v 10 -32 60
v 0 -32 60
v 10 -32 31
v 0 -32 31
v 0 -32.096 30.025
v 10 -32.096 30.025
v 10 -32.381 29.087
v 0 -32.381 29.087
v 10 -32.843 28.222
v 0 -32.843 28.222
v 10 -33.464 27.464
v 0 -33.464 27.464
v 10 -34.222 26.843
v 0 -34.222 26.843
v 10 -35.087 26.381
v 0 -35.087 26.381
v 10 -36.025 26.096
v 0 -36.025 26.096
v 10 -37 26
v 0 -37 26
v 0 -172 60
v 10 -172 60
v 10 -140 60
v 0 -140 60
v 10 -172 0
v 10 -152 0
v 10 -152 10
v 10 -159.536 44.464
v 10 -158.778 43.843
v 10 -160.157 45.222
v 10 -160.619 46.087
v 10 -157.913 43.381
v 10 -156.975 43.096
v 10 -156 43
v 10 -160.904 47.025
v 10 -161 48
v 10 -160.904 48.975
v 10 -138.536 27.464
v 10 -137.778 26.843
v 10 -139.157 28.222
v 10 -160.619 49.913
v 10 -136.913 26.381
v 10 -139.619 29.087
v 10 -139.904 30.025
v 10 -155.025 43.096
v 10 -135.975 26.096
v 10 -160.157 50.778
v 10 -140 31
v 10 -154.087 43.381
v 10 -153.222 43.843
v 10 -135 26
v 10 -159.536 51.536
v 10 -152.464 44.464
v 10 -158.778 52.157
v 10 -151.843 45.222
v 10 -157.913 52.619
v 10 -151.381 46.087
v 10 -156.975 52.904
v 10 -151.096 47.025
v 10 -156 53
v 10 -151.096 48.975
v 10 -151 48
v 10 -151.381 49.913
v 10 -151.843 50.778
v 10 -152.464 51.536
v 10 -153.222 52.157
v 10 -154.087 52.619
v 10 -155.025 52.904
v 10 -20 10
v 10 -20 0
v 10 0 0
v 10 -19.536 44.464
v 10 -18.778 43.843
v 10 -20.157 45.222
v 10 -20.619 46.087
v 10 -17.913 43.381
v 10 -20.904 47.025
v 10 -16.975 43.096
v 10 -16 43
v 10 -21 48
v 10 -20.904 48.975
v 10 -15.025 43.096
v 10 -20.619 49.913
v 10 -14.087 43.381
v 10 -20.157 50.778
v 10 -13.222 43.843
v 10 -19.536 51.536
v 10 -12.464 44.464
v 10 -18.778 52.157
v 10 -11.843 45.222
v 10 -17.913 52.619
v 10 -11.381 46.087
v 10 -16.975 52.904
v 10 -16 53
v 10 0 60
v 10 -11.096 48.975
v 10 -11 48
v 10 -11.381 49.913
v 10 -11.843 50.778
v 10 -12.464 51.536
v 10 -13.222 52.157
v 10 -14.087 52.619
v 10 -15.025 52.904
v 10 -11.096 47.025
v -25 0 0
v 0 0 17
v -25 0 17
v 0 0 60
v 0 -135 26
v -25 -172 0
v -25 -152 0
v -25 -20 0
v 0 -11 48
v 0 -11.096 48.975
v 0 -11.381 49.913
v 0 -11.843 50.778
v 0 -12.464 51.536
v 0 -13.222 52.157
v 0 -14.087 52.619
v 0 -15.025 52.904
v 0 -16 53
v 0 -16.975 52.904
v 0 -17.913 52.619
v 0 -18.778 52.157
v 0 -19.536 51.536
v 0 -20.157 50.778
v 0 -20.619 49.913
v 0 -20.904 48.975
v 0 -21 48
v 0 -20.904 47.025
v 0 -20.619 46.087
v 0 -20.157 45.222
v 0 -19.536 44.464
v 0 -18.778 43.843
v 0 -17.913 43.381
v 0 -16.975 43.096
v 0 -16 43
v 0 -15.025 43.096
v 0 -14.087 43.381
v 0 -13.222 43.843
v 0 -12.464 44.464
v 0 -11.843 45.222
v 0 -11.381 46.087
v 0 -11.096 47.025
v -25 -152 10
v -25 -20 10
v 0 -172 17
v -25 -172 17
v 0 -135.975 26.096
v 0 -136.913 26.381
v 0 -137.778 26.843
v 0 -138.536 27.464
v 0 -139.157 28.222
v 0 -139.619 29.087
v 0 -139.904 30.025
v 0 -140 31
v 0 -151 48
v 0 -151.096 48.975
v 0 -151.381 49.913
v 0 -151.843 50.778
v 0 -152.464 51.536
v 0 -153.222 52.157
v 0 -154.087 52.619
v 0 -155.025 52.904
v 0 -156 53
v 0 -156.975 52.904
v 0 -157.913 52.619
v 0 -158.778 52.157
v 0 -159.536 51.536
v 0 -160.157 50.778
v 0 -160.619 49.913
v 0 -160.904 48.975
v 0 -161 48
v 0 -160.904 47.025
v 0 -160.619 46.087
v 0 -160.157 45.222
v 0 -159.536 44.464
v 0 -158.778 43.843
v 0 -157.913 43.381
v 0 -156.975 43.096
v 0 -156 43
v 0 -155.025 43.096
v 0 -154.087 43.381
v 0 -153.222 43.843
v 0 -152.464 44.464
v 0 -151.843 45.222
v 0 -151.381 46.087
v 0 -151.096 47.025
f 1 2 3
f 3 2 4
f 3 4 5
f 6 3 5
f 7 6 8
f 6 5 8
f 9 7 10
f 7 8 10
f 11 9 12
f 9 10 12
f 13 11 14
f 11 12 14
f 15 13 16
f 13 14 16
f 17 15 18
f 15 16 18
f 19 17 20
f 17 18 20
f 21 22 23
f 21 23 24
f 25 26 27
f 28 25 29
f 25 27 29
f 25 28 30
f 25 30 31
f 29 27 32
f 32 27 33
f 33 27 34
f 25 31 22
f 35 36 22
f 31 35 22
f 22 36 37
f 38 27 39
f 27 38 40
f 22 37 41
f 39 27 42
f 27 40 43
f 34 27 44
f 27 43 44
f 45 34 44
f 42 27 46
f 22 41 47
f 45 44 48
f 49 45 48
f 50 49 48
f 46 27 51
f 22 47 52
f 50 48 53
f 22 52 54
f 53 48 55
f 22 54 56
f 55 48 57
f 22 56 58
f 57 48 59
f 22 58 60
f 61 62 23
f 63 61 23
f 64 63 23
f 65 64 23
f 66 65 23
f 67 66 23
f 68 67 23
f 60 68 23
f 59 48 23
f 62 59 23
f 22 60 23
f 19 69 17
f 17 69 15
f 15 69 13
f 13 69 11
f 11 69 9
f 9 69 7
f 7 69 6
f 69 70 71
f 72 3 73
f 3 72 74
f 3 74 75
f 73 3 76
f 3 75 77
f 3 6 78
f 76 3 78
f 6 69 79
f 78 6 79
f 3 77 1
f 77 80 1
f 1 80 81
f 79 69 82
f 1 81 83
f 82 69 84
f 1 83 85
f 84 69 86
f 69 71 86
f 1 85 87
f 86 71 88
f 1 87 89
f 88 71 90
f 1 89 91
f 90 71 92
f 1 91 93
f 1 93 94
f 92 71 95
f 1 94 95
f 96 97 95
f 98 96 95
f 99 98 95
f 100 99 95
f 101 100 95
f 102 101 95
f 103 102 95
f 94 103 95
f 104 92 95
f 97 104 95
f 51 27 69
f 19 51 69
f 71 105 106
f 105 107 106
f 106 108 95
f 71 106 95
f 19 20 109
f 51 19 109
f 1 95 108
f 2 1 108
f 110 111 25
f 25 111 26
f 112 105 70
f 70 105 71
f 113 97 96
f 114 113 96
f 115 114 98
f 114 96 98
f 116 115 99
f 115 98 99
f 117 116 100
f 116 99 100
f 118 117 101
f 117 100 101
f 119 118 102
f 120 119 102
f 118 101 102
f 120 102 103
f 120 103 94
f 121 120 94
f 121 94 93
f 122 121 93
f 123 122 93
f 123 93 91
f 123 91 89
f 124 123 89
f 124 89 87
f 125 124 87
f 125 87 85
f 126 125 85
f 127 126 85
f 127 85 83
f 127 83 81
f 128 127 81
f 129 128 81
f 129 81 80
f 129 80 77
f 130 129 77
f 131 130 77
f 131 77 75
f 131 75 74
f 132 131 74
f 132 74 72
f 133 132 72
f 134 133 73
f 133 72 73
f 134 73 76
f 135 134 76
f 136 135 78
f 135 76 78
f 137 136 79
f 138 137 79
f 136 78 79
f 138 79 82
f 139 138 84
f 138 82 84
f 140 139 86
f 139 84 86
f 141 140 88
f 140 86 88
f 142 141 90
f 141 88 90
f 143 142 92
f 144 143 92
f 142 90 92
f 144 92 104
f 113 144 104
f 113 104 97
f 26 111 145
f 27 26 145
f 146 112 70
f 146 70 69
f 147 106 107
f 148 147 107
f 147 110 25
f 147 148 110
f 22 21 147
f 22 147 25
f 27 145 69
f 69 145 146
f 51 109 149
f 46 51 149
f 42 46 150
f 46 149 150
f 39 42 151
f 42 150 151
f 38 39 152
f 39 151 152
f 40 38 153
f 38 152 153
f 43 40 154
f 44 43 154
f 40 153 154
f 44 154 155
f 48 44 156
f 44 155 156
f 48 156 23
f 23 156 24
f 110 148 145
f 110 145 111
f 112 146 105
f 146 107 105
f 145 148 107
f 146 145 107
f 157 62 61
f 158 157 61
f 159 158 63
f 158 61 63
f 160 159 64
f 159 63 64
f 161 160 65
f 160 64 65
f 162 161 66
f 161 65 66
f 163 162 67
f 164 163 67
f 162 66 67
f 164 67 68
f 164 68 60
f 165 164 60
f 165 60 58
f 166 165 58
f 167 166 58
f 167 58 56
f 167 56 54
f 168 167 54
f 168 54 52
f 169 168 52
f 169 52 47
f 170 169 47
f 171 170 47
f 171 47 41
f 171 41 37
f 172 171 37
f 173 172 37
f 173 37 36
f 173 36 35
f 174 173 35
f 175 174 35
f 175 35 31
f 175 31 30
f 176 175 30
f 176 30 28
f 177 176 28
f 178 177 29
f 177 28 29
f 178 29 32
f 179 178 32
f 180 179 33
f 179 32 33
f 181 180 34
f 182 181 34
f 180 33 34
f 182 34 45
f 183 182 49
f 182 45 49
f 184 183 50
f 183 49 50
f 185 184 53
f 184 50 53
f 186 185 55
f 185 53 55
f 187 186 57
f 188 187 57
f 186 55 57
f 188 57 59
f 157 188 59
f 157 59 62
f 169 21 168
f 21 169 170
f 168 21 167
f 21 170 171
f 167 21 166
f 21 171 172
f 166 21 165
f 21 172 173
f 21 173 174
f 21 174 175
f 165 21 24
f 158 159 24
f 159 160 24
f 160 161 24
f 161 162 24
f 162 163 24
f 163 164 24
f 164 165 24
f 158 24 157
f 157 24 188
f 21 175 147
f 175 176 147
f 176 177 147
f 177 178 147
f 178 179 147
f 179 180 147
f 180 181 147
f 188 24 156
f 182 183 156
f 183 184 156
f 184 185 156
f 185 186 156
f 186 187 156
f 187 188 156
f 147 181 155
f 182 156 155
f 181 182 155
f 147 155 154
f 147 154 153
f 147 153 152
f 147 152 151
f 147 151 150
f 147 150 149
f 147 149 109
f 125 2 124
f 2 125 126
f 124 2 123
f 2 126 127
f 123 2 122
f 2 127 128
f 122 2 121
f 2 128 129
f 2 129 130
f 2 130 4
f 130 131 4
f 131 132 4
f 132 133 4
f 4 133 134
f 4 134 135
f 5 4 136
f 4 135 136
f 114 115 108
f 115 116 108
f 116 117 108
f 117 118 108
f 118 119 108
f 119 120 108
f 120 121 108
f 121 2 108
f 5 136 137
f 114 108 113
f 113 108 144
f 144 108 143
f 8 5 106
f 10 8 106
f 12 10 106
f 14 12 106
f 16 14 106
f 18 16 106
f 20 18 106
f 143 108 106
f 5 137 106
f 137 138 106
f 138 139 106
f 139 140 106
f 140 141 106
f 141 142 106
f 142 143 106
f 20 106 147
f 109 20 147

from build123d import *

# Parameters (mm, degrees)
F1_DEPTH = 172
F3_DEPTH = 10
F5_W     = 132
F5_H     = 10
F6_DEPTH = 35
F8_D     = 10


with BuildPart() as f1:
    # F0 (on Front) → F1 (new body)
    with BuildSketch(Plane.XZ):
        Polygon((-25, 0), (0, 0), (10, 0), (10, 17), (10, 60), (0, 60), (0, 17), (-25, 17), align=None)
    extrude(amount=F1_DEPTH)

    # F2 (on face) → F3 (cut)
    with BuildSketch(Plane(origin=(0, 0, 0), x_dir=(0, -1, 0), z_dir=(-1, 0, 0))):
        with BuildLine():
            Line((140, 31), (140, 60))
            Line((140, 60), (32, 60))
            Line((32, 60), (32, 31))
            ThreePointArc((32, 31), (33.464466, 27.464466), (37, 26))
            Line((37, 26), (135, 26))
            ThreePointArc((135, 26), (138.535534, 27.464466), (140, 31))
        make_face()
    extrude(amount=-F3_DEPTH, mode=Mode.SUBTRACT)

    # F5 (on offset) → F6 (cut)
    with BuildSketch(Plane.YZ.offset(-25)):
        with Locations((-86, 5)):
            Rectangle(F5_W, F5_H)
    extrude(amount=F6_DEPTH, mode=Mode.SUBTRACT)

    # F8 (through all)
    with Locations(Plane(origin=(0, 0, 0), x_dir=(0, -1, 0), z_dir=(-1, 0, 0))):
        with Locations((16, 48), (156, 48)):
            Hole(F8_D / 2)


solid = f1.part
